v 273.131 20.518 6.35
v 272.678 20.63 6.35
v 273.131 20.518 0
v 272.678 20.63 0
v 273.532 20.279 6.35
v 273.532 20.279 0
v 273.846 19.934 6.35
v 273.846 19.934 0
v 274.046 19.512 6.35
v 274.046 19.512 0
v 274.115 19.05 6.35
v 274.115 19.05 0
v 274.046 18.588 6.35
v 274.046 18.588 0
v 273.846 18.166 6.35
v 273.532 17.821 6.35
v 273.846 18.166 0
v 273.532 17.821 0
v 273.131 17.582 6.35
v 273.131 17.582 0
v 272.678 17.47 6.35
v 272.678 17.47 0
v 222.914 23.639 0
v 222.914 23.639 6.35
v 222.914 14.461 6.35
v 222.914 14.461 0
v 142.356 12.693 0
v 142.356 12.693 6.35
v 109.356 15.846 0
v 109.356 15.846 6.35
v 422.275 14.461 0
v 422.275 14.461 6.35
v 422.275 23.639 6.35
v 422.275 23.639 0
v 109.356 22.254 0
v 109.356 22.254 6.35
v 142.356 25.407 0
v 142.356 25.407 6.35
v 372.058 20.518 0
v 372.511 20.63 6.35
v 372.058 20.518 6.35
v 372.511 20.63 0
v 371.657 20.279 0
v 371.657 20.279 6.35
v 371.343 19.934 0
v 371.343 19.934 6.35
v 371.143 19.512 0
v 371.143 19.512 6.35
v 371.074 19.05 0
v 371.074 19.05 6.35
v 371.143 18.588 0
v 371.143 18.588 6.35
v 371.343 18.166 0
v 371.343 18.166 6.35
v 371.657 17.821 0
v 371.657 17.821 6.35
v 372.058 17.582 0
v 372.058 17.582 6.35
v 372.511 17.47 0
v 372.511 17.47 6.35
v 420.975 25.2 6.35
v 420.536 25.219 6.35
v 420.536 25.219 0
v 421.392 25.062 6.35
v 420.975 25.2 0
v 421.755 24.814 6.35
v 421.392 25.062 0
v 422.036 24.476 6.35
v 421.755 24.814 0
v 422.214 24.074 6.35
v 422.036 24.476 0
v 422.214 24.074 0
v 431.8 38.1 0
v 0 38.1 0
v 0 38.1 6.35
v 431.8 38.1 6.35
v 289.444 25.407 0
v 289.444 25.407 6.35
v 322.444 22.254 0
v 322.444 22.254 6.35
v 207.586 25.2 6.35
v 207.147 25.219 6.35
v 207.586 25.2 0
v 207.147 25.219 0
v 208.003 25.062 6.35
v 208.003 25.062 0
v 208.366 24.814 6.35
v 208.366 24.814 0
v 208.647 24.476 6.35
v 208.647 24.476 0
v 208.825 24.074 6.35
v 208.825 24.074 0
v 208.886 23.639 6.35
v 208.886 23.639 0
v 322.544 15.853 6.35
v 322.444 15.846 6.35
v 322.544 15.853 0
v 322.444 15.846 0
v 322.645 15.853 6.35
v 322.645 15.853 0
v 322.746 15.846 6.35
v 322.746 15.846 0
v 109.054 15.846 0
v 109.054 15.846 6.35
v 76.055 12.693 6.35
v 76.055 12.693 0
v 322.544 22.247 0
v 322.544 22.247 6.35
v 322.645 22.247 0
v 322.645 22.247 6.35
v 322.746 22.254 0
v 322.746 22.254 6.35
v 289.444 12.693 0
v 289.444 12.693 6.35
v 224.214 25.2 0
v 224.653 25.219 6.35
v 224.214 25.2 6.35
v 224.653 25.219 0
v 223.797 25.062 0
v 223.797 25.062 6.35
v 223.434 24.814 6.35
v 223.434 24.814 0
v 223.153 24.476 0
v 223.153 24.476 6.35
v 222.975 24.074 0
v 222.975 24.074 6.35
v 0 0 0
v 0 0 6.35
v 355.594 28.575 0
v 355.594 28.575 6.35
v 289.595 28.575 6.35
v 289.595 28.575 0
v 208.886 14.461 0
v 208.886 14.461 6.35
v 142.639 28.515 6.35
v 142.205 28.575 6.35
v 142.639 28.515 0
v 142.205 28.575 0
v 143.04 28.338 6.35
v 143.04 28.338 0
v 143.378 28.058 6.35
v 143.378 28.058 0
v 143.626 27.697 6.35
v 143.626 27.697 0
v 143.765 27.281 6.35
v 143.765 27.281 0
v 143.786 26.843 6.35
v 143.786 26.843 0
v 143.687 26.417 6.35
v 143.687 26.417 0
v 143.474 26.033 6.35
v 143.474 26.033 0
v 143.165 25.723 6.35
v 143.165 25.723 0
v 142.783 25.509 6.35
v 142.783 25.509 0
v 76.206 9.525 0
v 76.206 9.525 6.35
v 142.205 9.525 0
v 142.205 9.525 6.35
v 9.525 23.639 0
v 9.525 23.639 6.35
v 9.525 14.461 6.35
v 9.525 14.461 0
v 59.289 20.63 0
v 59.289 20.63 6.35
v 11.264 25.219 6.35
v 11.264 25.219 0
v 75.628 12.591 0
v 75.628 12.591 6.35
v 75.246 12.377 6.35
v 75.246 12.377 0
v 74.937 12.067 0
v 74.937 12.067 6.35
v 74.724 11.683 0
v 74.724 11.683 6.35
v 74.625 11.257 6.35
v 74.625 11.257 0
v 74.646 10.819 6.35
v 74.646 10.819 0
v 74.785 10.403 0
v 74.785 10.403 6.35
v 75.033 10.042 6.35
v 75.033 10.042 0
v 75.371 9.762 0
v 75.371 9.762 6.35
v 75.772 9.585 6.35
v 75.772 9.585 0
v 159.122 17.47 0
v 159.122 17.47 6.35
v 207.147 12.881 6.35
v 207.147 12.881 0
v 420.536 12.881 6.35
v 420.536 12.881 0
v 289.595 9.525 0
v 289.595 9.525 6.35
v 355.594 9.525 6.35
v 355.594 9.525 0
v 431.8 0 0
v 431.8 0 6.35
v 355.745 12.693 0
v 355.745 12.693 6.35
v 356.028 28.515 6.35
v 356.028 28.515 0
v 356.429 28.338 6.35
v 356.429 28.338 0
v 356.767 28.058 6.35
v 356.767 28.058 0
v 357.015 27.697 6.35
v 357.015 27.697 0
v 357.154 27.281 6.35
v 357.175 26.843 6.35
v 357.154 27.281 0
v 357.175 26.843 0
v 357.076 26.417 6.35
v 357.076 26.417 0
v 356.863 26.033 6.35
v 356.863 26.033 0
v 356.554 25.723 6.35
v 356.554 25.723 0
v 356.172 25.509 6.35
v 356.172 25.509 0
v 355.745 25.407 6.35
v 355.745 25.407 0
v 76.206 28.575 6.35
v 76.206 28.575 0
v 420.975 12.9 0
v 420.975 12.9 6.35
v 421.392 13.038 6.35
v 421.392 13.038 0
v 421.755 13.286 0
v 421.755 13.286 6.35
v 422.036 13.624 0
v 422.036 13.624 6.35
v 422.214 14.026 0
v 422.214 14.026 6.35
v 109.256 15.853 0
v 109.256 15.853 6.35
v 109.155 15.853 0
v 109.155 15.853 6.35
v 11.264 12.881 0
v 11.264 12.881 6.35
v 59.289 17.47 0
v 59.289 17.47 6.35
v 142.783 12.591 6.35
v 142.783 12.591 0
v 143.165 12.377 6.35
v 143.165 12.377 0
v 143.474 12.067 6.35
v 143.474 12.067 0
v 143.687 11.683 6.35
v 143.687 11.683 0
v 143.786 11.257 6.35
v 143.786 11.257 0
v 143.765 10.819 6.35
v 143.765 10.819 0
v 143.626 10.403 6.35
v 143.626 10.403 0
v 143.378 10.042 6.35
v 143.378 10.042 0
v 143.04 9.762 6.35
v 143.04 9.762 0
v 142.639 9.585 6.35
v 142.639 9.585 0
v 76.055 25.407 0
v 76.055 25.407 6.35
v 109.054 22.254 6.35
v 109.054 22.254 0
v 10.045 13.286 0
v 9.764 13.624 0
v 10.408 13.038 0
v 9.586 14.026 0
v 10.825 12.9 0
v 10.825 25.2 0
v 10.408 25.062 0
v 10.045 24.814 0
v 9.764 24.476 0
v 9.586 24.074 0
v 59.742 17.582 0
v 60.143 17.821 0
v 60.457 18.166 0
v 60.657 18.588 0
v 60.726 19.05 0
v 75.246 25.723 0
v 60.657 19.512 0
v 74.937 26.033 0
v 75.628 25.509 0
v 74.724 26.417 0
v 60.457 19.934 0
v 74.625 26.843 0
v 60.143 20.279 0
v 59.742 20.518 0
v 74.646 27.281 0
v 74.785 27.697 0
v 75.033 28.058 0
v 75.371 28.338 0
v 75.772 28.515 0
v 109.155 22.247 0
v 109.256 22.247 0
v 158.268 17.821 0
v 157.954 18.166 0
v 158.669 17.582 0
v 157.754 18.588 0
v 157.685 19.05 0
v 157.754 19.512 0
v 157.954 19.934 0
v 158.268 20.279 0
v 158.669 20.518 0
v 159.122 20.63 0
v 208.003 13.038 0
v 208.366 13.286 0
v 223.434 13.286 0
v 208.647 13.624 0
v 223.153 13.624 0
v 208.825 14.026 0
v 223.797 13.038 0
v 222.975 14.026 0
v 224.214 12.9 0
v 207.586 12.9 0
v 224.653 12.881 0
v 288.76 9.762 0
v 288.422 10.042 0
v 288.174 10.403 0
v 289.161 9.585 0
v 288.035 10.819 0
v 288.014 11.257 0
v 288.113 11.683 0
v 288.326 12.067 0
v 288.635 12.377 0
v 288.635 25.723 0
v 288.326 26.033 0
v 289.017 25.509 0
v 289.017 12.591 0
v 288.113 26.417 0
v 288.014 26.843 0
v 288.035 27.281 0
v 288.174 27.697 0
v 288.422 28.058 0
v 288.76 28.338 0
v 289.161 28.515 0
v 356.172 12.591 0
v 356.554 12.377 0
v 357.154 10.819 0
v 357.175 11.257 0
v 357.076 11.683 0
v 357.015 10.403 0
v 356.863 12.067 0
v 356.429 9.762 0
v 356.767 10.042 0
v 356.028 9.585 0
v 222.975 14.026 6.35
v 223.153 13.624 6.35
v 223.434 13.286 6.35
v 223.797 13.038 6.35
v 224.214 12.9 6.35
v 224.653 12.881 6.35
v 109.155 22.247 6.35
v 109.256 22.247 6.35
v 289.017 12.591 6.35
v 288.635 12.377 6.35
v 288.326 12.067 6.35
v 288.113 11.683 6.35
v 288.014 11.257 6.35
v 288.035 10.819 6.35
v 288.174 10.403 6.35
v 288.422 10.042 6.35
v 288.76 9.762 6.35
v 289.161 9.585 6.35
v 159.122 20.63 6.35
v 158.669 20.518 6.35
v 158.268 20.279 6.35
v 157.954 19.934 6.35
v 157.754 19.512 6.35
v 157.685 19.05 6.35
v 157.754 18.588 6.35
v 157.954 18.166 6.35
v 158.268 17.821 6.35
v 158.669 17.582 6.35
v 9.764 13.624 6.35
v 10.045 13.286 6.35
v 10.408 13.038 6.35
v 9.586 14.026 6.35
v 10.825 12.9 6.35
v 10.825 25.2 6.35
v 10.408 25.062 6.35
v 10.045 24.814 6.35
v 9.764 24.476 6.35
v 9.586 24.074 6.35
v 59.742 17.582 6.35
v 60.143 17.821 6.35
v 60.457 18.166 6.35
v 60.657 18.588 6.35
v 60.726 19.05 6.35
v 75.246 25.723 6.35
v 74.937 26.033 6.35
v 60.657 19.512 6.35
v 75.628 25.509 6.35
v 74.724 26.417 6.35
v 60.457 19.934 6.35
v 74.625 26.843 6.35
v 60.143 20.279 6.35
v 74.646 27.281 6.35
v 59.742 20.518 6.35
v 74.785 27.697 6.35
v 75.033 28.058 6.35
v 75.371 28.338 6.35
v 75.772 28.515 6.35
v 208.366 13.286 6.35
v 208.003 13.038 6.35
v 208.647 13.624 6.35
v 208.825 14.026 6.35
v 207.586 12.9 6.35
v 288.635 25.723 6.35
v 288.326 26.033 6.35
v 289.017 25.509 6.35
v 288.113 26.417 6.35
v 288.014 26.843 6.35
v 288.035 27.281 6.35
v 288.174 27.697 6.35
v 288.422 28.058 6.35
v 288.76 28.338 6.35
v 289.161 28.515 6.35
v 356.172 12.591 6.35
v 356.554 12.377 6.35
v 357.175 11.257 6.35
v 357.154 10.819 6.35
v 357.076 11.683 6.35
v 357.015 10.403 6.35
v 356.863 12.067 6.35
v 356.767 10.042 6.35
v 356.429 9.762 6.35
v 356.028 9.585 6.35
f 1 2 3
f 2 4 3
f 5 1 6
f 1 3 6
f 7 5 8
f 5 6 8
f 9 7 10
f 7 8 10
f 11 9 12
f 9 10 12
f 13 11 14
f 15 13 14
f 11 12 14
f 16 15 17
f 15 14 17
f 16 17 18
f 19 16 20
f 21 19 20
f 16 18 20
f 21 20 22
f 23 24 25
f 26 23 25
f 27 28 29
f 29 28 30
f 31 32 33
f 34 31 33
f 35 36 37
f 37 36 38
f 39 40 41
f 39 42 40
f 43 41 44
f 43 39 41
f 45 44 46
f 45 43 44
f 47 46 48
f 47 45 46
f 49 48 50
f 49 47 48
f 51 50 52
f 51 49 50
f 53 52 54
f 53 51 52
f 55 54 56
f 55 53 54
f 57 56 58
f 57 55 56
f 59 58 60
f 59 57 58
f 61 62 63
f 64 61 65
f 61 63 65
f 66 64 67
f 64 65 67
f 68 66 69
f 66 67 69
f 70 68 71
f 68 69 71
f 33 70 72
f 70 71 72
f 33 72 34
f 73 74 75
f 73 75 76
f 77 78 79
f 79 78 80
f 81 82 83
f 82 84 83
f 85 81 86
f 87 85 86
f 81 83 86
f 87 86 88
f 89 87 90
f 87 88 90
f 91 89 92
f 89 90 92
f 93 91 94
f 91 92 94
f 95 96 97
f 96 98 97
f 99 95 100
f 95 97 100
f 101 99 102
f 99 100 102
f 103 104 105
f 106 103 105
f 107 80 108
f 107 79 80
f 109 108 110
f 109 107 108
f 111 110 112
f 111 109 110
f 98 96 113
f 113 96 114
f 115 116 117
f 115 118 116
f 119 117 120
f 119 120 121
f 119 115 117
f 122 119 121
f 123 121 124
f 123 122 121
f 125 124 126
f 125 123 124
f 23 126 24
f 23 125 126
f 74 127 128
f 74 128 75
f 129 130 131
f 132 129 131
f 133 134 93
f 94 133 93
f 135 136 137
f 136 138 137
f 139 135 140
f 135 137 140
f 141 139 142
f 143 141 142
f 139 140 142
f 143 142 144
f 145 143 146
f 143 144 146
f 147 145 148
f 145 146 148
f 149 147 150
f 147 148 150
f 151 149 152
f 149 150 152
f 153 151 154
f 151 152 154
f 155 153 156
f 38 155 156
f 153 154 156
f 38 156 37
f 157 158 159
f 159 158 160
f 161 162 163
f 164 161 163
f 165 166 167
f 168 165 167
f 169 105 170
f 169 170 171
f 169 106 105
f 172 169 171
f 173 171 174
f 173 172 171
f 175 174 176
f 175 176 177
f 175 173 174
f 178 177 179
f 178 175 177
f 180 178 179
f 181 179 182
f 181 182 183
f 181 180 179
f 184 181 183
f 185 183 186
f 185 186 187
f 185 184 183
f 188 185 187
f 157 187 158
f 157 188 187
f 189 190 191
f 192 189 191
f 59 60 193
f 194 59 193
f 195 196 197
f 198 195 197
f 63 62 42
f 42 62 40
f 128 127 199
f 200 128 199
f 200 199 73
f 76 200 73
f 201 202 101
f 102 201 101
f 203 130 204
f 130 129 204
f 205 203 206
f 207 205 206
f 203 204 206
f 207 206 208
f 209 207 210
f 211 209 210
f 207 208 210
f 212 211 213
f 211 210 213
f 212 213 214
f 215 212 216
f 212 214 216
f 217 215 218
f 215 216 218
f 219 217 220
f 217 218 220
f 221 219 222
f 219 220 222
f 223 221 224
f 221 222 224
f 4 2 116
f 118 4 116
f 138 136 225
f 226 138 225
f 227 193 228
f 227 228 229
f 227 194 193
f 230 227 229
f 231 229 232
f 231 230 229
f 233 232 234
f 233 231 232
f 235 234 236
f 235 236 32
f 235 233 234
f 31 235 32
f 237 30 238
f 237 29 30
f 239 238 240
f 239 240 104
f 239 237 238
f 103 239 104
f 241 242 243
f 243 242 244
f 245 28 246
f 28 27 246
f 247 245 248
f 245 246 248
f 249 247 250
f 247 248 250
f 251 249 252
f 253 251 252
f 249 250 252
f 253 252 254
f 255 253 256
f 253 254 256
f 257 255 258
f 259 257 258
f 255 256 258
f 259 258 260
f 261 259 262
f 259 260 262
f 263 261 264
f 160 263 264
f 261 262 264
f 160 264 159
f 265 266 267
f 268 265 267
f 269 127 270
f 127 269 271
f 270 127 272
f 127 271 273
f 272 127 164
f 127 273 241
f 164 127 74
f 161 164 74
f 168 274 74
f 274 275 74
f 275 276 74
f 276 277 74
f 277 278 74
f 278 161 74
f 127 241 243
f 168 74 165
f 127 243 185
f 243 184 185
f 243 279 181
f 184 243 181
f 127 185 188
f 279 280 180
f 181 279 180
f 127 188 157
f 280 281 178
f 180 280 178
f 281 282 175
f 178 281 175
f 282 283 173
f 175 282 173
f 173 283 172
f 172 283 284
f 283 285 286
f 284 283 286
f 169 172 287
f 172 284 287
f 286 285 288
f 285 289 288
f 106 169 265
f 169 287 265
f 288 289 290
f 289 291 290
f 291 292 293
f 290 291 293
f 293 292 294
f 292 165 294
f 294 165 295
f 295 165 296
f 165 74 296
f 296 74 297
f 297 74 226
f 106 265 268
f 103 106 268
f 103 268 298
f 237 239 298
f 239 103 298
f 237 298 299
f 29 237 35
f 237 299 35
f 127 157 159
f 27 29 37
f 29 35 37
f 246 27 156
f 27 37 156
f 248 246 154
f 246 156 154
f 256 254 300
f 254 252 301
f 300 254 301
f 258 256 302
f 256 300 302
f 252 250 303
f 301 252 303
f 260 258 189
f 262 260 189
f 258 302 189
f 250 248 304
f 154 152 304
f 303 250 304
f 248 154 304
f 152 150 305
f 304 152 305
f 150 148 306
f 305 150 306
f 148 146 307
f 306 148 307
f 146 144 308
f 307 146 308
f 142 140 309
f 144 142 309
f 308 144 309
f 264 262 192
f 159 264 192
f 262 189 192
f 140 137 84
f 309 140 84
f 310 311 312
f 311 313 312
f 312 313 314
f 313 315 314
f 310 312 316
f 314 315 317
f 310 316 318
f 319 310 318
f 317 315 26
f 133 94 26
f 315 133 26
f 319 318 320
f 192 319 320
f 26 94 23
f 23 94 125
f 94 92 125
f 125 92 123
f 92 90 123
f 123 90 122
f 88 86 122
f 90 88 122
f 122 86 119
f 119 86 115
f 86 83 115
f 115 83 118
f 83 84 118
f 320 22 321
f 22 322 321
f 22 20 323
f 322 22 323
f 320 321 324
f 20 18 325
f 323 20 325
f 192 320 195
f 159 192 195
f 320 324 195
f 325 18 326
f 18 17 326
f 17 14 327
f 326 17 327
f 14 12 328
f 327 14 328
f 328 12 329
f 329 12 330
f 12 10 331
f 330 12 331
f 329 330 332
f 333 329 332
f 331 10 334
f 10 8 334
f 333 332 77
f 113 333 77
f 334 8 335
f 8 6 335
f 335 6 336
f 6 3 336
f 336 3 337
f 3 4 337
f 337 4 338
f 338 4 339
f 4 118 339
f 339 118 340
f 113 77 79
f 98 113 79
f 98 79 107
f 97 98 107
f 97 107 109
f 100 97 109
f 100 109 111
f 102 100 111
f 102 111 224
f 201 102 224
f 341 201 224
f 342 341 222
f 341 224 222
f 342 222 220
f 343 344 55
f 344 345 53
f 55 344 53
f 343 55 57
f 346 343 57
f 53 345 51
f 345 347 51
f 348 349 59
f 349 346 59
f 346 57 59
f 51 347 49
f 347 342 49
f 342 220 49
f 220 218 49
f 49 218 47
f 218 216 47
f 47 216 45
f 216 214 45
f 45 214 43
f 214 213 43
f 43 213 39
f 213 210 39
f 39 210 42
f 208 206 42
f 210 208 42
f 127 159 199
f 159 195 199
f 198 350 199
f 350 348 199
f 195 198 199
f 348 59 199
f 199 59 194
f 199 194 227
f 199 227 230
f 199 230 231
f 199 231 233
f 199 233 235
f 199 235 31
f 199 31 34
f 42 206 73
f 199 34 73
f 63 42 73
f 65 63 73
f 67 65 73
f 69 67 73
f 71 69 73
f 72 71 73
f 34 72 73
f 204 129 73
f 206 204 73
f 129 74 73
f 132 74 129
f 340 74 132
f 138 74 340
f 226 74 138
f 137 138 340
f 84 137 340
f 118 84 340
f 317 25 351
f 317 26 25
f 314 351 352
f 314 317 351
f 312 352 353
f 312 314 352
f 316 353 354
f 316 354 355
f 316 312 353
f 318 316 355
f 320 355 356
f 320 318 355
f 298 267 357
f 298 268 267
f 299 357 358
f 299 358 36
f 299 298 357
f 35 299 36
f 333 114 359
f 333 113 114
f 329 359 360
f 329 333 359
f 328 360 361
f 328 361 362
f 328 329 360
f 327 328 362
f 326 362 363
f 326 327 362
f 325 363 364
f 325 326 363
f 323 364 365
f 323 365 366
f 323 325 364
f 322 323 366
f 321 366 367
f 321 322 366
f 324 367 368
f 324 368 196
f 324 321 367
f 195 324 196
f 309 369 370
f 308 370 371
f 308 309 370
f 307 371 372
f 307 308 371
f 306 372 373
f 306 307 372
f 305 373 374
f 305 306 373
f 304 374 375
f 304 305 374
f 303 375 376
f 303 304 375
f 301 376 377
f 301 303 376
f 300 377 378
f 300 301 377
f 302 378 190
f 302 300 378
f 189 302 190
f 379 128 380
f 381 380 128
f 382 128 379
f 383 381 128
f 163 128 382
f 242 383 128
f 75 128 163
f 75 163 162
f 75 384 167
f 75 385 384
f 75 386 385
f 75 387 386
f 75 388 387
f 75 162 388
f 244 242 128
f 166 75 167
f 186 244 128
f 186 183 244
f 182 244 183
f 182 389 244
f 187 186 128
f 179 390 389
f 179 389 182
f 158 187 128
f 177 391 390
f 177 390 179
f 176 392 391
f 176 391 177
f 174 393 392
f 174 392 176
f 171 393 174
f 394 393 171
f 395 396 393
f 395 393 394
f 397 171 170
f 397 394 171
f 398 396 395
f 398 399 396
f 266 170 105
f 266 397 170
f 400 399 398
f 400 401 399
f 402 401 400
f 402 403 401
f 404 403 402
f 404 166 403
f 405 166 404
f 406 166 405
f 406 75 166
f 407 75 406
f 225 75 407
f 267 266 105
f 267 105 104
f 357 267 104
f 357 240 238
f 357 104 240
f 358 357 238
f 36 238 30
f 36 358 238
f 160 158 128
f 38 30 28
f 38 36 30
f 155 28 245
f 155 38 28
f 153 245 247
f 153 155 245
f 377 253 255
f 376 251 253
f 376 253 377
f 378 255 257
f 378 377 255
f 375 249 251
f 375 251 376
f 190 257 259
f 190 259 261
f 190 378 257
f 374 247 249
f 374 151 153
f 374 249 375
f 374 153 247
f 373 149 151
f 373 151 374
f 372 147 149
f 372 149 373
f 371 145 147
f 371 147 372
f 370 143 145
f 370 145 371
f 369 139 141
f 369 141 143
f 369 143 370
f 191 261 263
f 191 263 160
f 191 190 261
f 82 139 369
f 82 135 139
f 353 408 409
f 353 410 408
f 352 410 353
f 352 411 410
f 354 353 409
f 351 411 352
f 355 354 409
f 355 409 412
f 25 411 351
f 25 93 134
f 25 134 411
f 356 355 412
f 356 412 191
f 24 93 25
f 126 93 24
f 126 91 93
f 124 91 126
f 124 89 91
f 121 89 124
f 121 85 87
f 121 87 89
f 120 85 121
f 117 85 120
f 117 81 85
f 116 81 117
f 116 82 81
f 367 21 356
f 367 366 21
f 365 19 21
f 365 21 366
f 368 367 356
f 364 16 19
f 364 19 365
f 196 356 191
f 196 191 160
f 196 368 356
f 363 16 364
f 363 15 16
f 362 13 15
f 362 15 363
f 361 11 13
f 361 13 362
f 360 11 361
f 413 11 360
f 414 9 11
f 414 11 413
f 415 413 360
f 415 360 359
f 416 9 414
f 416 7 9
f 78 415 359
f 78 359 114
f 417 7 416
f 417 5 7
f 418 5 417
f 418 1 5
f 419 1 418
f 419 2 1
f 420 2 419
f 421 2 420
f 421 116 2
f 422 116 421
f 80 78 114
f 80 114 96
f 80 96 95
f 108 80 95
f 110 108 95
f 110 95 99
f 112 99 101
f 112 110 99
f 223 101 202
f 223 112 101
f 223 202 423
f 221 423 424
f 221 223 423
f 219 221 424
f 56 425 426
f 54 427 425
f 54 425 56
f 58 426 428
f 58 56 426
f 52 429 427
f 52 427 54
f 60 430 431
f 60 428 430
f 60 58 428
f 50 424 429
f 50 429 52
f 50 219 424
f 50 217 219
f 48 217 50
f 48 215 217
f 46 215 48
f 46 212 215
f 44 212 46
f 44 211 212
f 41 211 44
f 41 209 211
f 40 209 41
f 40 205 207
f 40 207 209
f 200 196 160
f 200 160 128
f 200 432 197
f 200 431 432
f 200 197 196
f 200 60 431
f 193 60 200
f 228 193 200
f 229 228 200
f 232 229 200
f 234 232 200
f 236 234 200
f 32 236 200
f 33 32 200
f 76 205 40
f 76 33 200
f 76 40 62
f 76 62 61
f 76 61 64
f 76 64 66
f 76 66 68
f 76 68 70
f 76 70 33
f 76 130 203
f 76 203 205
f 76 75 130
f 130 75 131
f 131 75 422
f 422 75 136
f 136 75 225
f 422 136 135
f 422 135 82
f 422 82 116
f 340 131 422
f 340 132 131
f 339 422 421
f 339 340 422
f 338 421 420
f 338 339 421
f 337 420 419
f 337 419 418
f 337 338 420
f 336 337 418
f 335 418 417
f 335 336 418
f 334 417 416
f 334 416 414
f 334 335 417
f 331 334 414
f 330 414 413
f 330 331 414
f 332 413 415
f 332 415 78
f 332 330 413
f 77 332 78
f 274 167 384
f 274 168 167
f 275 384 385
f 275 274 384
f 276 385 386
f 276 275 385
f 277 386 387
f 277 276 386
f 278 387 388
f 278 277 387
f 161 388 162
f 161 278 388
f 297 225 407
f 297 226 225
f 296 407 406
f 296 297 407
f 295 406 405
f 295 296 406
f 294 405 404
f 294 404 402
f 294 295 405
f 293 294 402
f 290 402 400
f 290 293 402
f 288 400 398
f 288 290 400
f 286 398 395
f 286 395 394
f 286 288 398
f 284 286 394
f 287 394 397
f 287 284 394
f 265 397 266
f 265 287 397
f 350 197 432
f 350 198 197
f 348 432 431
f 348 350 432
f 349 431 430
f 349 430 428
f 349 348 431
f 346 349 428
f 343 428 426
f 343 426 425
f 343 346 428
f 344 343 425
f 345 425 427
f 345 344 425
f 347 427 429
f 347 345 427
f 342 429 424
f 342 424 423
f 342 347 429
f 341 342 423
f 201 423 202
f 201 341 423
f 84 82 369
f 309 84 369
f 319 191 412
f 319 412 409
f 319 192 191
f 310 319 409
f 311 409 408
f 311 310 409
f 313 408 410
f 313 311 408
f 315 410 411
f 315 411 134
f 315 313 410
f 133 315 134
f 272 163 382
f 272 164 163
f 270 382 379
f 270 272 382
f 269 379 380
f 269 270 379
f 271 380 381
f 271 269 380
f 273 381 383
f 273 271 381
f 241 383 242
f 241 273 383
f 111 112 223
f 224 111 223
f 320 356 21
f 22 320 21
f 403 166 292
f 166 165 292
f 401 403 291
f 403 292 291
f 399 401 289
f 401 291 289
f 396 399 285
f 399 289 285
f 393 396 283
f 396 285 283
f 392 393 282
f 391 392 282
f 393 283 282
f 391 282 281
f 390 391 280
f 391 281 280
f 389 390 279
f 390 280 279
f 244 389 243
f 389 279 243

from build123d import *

# Parameters (mm, degrees)
SKETCH1_W           = 431.8
SKETCH1_H           = 38.1
BOSS_EXTRUDE1_DEPTH = 6.35
CUT_EXTRUDE1_DEPTH  = 434.524131393
FILLET1_R           = 1.5875


with BuildPart() as part:
    # Sketch1 → Boss-Extrude1 (new body)
    with BuildSketch(Plane.XY):
        with Locations((215.9, 19.05)):
            Rectangle(SKETCH1_W, SKETCH1_H)
    extrude(amount=BOSS_EXTRUDE1_DEPTH)

    # Sketch3 → Cut-Extrude1 (cut, through all)
    with BuildSketch(Plane.XY.offset(6.35)):
        Polygon((75.827293092, 19.05), (9.525, 25.385537758), (9.525, 12.714462242), align=None)
        Polygon((175.507756818, 28.575), (42.903170633, 28.575), (109.205463726, 22.239462242), align=None)
        Polygon((175.507756818, 9.525), (109.205463726, 15.860537758), (42.903170633, 9.525), align=None)
        Polygon((208.885927451, 25.385537758), (142.583634359, 19.05), (208.885927451, 12.714462242), align=None)
        Polygon((289.216365641, 19.05), (222.914072549, 25.385537758), (222.914072549, 12.714462242), align=None)
        Polygon((388.896829367, 28.575), (256.292243182, 28.575), (322.594536274, 22.239462242), align=None)
        Polygon((322.594536274, 15.860537758), (256.292243182, 9.525), (388.896829367, 9.525), align=None)
        Polygon((422.275, 25.385537758), (355.972706908, 19.05), (422.275, 12.714462242), align=None)
    extrude(amount=-CUT_EXTRUDE1_DEPTH, mode=Mode.SUBTRACT)

    # Fillet1
    fillet1_edges = [part.edges().sort_by_distance(p)[0] for p in [
        (289.216365641, 19.05, 3.175),
        (222.914072549, 12.714462242, 3.175),
        (222.914072549, 25.385537758, 3.175),
        (142.583634359, 19.05, 3.175),
        (208.885927451, 25.385537758, 3.175),
        (208.885927451, 12.714462242, 3.175),
        (42.903170633, 9.525, 3.175),
        (109.205463726, 15.860537758, 3.175),
        (175.507756818, 9.525, 3.175),
        (109.205463726, 22.239462242, 3.175),
        (42.903170633, 28.575, 3.175),
        (175.507756818, 28.575, 3.175),
        (422.275, 25.385537758, 3.175),
        (422.275, 12.714462242, 3.175),
        (355.972706908, 19.05, 3.175),
        (322.594536274, 15.860537758, 3.175),
        (388.896829367, 9.525, 3.175),
        (256.292243182, 9.525, 3.175),
        (388.896829367, 28.575, 3.175),
        (322.594536274, 22.239462242, 3.175),
        (256.292243182, 28.575, 3.175),
        (9.525, 12.714462242, 3.175),
        (9.525, 25.385537758, 3.175),
        (75.827293092, 19.05, 3.175),
    ]]
    fillet(fillet1_edges, radius=FILLET1_R)


solid = part.part
